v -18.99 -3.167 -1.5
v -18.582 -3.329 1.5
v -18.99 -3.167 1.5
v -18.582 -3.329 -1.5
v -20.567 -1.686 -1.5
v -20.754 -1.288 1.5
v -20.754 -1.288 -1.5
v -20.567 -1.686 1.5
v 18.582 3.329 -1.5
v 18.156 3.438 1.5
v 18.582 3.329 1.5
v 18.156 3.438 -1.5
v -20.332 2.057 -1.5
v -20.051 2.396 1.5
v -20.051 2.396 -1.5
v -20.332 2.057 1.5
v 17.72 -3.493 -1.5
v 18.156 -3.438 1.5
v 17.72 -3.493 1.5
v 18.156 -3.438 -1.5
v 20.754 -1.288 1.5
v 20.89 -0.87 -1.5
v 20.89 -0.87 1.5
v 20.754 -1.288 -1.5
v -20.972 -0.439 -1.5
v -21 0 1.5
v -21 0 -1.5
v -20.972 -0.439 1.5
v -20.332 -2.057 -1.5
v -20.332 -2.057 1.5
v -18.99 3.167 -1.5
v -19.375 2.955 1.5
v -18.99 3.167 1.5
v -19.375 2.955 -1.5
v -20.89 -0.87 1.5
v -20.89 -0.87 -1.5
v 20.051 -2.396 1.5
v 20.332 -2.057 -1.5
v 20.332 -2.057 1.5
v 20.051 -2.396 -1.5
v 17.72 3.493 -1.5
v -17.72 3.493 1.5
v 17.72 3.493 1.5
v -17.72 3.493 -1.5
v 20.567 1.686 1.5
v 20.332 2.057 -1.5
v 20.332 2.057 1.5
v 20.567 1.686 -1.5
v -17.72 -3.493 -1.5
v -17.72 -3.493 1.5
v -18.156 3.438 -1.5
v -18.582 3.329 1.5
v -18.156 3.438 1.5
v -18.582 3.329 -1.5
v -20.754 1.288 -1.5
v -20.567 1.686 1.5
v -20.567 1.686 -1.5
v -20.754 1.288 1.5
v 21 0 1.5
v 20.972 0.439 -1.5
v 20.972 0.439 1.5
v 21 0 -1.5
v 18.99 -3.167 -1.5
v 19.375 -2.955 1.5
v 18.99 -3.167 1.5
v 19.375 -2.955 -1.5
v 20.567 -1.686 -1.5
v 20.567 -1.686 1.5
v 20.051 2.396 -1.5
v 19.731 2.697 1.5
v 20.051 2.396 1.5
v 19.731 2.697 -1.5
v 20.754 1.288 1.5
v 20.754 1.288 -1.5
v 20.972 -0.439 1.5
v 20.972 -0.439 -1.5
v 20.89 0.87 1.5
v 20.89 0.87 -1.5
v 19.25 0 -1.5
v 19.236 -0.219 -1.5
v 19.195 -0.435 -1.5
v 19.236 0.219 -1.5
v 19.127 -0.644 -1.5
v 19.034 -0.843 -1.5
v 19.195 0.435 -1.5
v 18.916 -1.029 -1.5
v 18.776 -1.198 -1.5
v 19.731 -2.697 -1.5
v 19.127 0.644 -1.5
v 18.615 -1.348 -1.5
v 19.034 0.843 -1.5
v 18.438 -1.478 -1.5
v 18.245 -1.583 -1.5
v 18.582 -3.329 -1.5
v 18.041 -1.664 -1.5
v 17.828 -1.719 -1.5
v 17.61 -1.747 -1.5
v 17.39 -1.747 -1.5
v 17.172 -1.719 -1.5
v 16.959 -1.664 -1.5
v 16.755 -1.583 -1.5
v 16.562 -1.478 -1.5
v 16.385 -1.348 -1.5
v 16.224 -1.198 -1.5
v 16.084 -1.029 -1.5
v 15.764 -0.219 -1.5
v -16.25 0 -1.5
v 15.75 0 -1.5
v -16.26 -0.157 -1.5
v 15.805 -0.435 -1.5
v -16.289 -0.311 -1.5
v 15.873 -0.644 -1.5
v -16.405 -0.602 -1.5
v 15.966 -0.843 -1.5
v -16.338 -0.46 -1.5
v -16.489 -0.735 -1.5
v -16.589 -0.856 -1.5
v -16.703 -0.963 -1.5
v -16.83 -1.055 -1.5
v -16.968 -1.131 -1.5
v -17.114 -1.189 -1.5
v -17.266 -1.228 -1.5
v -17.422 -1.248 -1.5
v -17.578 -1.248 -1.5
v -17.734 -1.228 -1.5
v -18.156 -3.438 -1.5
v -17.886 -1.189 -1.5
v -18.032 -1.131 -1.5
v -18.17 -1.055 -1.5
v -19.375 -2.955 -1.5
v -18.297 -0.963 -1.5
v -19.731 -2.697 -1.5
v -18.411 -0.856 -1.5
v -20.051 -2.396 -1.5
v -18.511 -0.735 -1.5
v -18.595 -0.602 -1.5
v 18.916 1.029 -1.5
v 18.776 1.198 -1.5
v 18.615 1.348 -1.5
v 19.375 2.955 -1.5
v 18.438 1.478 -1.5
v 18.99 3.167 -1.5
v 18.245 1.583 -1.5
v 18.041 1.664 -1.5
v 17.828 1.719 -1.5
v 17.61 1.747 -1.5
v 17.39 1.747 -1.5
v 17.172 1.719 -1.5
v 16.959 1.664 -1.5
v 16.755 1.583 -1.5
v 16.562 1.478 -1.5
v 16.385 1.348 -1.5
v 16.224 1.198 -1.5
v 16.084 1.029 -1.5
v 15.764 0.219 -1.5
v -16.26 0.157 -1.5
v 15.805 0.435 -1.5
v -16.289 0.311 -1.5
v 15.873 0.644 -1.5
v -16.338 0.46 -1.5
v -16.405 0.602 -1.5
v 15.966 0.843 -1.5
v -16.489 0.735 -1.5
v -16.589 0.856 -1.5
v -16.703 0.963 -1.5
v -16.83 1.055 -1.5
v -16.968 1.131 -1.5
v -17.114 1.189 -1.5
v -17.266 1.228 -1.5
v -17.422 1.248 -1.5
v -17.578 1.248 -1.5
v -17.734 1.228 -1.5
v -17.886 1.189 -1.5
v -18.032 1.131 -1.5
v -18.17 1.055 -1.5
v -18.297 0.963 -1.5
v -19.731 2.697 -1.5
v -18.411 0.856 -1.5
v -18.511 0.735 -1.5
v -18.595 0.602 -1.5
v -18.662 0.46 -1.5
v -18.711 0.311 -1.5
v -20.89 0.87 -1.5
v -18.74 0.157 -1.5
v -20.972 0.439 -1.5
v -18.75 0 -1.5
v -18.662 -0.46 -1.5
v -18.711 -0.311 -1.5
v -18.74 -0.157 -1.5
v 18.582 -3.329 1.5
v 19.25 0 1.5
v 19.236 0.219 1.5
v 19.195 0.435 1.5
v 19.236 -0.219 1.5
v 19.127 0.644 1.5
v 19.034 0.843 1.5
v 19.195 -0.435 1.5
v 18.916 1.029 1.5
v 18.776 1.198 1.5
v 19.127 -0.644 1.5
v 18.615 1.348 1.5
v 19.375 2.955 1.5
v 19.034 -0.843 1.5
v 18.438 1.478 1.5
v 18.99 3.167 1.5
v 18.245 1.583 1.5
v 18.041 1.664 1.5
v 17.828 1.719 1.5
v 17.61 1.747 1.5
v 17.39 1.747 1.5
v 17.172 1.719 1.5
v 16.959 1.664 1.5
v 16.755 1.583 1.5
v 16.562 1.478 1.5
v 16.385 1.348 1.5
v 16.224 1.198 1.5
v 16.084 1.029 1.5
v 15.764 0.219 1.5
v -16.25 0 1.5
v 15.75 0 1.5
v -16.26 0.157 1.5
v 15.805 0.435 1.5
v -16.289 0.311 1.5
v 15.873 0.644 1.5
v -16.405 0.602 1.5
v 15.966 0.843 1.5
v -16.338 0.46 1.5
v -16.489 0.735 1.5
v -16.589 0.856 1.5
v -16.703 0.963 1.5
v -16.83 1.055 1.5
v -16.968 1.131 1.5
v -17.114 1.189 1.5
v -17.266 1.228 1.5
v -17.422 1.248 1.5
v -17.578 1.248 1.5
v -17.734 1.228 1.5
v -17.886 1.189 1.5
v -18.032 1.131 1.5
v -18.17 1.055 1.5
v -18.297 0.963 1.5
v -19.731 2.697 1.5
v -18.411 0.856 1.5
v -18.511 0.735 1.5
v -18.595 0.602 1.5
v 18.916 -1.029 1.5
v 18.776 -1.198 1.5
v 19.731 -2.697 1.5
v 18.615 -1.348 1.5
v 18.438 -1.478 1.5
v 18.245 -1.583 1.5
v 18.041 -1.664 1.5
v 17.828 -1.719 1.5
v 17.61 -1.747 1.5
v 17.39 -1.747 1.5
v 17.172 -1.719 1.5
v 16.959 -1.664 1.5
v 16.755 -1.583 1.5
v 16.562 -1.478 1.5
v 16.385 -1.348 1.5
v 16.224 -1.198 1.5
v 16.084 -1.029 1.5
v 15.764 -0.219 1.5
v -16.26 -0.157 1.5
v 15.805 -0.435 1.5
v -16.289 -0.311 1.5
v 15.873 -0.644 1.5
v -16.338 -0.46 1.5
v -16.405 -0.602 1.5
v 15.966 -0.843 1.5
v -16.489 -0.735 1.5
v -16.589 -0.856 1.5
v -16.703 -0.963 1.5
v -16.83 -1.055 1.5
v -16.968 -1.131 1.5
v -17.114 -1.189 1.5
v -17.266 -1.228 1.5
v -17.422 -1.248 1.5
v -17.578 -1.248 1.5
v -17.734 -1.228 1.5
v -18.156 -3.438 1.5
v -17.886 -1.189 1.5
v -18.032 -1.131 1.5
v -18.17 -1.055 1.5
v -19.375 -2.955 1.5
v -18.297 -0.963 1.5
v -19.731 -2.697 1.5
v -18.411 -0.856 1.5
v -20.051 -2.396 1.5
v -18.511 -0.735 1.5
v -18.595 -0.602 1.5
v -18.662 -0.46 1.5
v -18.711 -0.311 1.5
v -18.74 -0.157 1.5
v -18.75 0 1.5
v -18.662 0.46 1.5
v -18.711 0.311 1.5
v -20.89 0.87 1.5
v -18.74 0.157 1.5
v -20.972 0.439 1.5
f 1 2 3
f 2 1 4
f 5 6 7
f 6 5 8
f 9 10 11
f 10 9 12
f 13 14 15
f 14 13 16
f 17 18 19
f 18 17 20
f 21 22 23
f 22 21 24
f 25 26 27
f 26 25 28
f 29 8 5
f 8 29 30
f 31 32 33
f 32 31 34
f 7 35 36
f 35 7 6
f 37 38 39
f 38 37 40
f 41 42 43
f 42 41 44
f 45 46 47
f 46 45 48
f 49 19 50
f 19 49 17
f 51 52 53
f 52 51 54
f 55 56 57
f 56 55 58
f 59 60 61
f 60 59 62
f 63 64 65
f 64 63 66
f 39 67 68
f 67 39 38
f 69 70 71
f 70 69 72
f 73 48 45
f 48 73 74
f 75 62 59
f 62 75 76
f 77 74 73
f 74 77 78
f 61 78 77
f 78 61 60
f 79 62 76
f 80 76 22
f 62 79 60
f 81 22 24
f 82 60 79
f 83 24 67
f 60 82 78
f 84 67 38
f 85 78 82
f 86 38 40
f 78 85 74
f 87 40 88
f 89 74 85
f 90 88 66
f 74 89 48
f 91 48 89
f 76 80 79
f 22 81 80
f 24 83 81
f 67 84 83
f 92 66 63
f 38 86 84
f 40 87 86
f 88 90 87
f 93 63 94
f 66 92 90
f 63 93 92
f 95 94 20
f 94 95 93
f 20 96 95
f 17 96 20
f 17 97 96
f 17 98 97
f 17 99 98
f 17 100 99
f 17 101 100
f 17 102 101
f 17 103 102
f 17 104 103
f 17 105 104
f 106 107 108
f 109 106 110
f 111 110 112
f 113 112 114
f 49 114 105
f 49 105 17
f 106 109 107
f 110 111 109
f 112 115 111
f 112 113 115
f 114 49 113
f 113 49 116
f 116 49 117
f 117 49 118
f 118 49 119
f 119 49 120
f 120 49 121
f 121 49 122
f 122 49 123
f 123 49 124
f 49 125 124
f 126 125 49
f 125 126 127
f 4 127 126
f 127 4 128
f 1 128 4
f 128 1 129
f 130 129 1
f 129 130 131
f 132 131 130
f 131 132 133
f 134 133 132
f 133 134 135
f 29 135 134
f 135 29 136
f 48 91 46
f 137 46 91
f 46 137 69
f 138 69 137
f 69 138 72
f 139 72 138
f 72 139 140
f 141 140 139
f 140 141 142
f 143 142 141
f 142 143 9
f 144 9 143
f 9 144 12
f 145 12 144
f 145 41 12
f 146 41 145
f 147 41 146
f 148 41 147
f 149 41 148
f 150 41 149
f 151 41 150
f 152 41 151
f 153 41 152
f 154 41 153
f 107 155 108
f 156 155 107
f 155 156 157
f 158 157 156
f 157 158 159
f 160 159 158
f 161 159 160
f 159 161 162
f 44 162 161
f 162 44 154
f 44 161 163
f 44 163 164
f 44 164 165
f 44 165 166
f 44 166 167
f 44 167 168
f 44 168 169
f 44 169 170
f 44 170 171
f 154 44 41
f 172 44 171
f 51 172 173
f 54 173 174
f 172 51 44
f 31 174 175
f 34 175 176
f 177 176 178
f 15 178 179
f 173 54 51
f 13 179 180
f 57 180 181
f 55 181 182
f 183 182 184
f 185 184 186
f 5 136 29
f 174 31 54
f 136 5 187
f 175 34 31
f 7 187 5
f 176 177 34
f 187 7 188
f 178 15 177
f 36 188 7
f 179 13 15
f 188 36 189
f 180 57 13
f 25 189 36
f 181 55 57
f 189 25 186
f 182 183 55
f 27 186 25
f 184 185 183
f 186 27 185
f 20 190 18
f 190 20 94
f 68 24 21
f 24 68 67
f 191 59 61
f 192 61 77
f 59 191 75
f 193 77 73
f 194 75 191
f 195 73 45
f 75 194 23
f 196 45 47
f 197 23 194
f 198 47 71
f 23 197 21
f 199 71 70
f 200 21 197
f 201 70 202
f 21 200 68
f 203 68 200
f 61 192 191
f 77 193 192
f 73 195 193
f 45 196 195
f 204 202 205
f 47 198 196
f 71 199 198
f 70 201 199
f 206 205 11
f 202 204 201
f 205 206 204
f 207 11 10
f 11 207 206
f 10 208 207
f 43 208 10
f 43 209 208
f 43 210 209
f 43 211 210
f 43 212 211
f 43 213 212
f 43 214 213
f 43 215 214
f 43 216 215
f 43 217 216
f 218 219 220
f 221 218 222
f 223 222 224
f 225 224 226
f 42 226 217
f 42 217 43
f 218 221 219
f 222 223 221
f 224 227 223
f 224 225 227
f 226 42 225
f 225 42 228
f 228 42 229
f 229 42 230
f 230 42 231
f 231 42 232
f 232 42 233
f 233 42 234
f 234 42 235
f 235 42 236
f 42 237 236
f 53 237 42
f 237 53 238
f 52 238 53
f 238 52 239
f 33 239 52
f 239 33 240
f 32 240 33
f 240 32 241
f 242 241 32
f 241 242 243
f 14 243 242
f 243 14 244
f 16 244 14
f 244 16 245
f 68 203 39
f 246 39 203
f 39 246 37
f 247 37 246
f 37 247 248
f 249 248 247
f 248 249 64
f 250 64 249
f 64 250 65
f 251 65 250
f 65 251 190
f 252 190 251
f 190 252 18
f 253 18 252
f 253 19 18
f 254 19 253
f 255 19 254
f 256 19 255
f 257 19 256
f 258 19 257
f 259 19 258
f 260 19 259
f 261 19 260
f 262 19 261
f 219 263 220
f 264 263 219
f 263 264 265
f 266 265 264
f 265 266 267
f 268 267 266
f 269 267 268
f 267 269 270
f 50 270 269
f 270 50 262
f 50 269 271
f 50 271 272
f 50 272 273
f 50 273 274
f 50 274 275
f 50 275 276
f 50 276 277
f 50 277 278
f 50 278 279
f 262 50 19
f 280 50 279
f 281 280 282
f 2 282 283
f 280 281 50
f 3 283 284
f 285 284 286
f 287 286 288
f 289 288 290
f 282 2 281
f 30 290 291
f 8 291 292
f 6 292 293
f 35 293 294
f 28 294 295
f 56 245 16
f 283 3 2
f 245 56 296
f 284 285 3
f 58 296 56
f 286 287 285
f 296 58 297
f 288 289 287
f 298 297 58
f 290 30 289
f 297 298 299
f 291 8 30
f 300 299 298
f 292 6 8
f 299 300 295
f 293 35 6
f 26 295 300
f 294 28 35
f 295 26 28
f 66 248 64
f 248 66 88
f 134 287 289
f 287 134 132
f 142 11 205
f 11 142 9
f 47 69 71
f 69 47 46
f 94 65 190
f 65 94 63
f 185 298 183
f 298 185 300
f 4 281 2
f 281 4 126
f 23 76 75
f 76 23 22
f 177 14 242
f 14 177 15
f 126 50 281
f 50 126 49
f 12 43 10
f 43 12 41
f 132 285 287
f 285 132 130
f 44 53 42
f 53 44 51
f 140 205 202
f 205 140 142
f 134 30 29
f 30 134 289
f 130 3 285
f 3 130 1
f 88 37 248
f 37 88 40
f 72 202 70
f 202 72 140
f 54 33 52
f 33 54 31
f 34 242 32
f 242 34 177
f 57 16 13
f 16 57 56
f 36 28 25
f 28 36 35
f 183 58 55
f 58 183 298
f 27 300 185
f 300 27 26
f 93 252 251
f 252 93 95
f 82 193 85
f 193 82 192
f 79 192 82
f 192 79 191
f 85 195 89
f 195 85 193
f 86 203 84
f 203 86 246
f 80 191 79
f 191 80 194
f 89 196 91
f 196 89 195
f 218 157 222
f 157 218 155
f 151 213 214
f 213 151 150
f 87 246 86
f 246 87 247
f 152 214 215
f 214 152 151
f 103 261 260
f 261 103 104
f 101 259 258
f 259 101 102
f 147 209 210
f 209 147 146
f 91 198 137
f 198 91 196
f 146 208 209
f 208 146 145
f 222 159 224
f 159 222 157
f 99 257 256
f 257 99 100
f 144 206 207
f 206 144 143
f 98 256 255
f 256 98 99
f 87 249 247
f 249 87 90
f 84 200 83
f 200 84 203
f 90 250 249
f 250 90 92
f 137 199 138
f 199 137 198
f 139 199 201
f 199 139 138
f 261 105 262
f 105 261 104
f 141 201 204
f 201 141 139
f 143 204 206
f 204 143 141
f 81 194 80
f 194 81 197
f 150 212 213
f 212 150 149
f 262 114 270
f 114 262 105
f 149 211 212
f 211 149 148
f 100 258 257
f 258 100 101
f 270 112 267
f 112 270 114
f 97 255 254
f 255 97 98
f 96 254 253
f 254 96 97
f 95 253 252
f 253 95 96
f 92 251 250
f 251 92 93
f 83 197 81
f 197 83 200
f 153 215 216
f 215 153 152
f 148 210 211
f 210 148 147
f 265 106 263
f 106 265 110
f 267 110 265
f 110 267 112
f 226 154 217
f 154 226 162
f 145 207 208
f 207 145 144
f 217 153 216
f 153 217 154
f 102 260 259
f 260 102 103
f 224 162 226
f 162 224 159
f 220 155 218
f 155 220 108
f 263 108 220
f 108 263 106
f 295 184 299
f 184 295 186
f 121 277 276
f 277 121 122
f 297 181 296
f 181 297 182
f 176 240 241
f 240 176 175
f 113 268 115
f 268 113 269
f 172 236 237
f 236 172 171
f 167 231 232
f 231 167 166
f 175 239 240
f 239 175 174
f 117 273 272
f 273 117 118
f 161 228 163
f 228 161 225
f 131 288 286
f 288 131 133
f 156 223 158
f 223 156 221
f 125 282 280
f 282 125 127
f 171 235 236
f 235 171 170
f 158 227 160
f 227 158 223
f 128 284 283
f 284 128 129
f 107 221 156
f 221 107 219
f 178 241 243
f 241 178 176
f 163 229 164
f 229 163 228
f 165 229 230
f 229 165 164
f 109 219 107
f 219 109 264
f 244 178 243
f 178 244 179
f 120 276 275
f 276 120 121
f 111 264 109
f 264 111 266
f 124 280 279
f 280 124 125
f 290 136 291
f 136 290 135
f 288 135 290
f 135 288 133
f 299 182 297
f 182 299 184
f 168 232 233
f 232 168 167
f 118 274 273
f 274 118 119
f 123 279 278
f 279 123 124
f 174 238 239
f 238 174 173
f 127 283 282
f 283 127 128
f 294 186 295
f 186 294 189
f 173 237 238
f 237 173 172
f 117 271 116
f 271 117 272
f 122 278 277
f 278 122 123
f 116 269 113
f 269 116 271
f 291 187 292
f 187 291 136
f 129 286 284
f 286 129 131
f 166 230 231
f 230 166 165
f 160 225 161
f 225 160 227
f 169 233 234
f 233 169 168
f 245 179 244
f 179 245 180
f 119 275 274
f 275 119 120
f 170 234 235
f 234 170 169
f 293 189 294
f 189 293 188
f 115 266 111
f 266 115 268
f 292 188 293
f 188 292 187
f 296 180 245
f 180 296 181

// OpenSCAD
/********************************************************
This file is part of the RepRapPNP project, developed at the University of Hamburg.

It heavily relies on the work by Jonas and Simon Kühling for the RepRap-Industrial design.

Author: Daniel Ahlers <2ahlers@informatik.uni-hamburg.de>
Maintainer: Florens Wasserfall <wasserfall@kalanka.de>
License: 'GNU Affero General Public License AGPLv3 http://www.gnu.org/licenses/agpl.html'
*******************************************************/

thickness=3;
$fn=50;

//Syringe
servo_connector(3.5,2.5,35,0,0);
//PNP
//servo_connector(3.5,2.5,57.5,0,4.5);

// parameters hole diameter1, hole diameter2, distance, hole1 clearance, hole2 clearance
module servo_connector(h1_dia, h2_dia, distance, h1_clear, h2_clear){
  difference() {
    union() {
      hull() {
        translate([distance/2,0,0])cylinder(r=3.5, h=thickness, center=true);
        translate([-distance/2,0,0])cylinder(r=3.5, h=thickness, center=true);
      }
      translate([distance/2,0,-thickness/2-h1_clear/2])cylinder(r=3.5, h=h1_clear, center=true);
      translate([-distance/2,0,-thickness/2-h2_clear/2])cylinder(r=3.5, h=h2_clear, center=true);
    }
    translate([distance/2, 0, -h1_clear])cylinder(d=h1_dia, h=thickness, center=true);
    translate([distance/2, 0, +thickness/2-h1_clear/2])cylinder(d=5.5, h=h1_clear, center=true);
    translate([-distance/2, 0, -h2_clear])cylinder(d=h2_dia, h=thickness, center=true);
    translate([-distance/2, 0, +thickness/2-h2_clear/2 ])cylinder(d=5.5, h=h2_clear, center=true);
  }

}
